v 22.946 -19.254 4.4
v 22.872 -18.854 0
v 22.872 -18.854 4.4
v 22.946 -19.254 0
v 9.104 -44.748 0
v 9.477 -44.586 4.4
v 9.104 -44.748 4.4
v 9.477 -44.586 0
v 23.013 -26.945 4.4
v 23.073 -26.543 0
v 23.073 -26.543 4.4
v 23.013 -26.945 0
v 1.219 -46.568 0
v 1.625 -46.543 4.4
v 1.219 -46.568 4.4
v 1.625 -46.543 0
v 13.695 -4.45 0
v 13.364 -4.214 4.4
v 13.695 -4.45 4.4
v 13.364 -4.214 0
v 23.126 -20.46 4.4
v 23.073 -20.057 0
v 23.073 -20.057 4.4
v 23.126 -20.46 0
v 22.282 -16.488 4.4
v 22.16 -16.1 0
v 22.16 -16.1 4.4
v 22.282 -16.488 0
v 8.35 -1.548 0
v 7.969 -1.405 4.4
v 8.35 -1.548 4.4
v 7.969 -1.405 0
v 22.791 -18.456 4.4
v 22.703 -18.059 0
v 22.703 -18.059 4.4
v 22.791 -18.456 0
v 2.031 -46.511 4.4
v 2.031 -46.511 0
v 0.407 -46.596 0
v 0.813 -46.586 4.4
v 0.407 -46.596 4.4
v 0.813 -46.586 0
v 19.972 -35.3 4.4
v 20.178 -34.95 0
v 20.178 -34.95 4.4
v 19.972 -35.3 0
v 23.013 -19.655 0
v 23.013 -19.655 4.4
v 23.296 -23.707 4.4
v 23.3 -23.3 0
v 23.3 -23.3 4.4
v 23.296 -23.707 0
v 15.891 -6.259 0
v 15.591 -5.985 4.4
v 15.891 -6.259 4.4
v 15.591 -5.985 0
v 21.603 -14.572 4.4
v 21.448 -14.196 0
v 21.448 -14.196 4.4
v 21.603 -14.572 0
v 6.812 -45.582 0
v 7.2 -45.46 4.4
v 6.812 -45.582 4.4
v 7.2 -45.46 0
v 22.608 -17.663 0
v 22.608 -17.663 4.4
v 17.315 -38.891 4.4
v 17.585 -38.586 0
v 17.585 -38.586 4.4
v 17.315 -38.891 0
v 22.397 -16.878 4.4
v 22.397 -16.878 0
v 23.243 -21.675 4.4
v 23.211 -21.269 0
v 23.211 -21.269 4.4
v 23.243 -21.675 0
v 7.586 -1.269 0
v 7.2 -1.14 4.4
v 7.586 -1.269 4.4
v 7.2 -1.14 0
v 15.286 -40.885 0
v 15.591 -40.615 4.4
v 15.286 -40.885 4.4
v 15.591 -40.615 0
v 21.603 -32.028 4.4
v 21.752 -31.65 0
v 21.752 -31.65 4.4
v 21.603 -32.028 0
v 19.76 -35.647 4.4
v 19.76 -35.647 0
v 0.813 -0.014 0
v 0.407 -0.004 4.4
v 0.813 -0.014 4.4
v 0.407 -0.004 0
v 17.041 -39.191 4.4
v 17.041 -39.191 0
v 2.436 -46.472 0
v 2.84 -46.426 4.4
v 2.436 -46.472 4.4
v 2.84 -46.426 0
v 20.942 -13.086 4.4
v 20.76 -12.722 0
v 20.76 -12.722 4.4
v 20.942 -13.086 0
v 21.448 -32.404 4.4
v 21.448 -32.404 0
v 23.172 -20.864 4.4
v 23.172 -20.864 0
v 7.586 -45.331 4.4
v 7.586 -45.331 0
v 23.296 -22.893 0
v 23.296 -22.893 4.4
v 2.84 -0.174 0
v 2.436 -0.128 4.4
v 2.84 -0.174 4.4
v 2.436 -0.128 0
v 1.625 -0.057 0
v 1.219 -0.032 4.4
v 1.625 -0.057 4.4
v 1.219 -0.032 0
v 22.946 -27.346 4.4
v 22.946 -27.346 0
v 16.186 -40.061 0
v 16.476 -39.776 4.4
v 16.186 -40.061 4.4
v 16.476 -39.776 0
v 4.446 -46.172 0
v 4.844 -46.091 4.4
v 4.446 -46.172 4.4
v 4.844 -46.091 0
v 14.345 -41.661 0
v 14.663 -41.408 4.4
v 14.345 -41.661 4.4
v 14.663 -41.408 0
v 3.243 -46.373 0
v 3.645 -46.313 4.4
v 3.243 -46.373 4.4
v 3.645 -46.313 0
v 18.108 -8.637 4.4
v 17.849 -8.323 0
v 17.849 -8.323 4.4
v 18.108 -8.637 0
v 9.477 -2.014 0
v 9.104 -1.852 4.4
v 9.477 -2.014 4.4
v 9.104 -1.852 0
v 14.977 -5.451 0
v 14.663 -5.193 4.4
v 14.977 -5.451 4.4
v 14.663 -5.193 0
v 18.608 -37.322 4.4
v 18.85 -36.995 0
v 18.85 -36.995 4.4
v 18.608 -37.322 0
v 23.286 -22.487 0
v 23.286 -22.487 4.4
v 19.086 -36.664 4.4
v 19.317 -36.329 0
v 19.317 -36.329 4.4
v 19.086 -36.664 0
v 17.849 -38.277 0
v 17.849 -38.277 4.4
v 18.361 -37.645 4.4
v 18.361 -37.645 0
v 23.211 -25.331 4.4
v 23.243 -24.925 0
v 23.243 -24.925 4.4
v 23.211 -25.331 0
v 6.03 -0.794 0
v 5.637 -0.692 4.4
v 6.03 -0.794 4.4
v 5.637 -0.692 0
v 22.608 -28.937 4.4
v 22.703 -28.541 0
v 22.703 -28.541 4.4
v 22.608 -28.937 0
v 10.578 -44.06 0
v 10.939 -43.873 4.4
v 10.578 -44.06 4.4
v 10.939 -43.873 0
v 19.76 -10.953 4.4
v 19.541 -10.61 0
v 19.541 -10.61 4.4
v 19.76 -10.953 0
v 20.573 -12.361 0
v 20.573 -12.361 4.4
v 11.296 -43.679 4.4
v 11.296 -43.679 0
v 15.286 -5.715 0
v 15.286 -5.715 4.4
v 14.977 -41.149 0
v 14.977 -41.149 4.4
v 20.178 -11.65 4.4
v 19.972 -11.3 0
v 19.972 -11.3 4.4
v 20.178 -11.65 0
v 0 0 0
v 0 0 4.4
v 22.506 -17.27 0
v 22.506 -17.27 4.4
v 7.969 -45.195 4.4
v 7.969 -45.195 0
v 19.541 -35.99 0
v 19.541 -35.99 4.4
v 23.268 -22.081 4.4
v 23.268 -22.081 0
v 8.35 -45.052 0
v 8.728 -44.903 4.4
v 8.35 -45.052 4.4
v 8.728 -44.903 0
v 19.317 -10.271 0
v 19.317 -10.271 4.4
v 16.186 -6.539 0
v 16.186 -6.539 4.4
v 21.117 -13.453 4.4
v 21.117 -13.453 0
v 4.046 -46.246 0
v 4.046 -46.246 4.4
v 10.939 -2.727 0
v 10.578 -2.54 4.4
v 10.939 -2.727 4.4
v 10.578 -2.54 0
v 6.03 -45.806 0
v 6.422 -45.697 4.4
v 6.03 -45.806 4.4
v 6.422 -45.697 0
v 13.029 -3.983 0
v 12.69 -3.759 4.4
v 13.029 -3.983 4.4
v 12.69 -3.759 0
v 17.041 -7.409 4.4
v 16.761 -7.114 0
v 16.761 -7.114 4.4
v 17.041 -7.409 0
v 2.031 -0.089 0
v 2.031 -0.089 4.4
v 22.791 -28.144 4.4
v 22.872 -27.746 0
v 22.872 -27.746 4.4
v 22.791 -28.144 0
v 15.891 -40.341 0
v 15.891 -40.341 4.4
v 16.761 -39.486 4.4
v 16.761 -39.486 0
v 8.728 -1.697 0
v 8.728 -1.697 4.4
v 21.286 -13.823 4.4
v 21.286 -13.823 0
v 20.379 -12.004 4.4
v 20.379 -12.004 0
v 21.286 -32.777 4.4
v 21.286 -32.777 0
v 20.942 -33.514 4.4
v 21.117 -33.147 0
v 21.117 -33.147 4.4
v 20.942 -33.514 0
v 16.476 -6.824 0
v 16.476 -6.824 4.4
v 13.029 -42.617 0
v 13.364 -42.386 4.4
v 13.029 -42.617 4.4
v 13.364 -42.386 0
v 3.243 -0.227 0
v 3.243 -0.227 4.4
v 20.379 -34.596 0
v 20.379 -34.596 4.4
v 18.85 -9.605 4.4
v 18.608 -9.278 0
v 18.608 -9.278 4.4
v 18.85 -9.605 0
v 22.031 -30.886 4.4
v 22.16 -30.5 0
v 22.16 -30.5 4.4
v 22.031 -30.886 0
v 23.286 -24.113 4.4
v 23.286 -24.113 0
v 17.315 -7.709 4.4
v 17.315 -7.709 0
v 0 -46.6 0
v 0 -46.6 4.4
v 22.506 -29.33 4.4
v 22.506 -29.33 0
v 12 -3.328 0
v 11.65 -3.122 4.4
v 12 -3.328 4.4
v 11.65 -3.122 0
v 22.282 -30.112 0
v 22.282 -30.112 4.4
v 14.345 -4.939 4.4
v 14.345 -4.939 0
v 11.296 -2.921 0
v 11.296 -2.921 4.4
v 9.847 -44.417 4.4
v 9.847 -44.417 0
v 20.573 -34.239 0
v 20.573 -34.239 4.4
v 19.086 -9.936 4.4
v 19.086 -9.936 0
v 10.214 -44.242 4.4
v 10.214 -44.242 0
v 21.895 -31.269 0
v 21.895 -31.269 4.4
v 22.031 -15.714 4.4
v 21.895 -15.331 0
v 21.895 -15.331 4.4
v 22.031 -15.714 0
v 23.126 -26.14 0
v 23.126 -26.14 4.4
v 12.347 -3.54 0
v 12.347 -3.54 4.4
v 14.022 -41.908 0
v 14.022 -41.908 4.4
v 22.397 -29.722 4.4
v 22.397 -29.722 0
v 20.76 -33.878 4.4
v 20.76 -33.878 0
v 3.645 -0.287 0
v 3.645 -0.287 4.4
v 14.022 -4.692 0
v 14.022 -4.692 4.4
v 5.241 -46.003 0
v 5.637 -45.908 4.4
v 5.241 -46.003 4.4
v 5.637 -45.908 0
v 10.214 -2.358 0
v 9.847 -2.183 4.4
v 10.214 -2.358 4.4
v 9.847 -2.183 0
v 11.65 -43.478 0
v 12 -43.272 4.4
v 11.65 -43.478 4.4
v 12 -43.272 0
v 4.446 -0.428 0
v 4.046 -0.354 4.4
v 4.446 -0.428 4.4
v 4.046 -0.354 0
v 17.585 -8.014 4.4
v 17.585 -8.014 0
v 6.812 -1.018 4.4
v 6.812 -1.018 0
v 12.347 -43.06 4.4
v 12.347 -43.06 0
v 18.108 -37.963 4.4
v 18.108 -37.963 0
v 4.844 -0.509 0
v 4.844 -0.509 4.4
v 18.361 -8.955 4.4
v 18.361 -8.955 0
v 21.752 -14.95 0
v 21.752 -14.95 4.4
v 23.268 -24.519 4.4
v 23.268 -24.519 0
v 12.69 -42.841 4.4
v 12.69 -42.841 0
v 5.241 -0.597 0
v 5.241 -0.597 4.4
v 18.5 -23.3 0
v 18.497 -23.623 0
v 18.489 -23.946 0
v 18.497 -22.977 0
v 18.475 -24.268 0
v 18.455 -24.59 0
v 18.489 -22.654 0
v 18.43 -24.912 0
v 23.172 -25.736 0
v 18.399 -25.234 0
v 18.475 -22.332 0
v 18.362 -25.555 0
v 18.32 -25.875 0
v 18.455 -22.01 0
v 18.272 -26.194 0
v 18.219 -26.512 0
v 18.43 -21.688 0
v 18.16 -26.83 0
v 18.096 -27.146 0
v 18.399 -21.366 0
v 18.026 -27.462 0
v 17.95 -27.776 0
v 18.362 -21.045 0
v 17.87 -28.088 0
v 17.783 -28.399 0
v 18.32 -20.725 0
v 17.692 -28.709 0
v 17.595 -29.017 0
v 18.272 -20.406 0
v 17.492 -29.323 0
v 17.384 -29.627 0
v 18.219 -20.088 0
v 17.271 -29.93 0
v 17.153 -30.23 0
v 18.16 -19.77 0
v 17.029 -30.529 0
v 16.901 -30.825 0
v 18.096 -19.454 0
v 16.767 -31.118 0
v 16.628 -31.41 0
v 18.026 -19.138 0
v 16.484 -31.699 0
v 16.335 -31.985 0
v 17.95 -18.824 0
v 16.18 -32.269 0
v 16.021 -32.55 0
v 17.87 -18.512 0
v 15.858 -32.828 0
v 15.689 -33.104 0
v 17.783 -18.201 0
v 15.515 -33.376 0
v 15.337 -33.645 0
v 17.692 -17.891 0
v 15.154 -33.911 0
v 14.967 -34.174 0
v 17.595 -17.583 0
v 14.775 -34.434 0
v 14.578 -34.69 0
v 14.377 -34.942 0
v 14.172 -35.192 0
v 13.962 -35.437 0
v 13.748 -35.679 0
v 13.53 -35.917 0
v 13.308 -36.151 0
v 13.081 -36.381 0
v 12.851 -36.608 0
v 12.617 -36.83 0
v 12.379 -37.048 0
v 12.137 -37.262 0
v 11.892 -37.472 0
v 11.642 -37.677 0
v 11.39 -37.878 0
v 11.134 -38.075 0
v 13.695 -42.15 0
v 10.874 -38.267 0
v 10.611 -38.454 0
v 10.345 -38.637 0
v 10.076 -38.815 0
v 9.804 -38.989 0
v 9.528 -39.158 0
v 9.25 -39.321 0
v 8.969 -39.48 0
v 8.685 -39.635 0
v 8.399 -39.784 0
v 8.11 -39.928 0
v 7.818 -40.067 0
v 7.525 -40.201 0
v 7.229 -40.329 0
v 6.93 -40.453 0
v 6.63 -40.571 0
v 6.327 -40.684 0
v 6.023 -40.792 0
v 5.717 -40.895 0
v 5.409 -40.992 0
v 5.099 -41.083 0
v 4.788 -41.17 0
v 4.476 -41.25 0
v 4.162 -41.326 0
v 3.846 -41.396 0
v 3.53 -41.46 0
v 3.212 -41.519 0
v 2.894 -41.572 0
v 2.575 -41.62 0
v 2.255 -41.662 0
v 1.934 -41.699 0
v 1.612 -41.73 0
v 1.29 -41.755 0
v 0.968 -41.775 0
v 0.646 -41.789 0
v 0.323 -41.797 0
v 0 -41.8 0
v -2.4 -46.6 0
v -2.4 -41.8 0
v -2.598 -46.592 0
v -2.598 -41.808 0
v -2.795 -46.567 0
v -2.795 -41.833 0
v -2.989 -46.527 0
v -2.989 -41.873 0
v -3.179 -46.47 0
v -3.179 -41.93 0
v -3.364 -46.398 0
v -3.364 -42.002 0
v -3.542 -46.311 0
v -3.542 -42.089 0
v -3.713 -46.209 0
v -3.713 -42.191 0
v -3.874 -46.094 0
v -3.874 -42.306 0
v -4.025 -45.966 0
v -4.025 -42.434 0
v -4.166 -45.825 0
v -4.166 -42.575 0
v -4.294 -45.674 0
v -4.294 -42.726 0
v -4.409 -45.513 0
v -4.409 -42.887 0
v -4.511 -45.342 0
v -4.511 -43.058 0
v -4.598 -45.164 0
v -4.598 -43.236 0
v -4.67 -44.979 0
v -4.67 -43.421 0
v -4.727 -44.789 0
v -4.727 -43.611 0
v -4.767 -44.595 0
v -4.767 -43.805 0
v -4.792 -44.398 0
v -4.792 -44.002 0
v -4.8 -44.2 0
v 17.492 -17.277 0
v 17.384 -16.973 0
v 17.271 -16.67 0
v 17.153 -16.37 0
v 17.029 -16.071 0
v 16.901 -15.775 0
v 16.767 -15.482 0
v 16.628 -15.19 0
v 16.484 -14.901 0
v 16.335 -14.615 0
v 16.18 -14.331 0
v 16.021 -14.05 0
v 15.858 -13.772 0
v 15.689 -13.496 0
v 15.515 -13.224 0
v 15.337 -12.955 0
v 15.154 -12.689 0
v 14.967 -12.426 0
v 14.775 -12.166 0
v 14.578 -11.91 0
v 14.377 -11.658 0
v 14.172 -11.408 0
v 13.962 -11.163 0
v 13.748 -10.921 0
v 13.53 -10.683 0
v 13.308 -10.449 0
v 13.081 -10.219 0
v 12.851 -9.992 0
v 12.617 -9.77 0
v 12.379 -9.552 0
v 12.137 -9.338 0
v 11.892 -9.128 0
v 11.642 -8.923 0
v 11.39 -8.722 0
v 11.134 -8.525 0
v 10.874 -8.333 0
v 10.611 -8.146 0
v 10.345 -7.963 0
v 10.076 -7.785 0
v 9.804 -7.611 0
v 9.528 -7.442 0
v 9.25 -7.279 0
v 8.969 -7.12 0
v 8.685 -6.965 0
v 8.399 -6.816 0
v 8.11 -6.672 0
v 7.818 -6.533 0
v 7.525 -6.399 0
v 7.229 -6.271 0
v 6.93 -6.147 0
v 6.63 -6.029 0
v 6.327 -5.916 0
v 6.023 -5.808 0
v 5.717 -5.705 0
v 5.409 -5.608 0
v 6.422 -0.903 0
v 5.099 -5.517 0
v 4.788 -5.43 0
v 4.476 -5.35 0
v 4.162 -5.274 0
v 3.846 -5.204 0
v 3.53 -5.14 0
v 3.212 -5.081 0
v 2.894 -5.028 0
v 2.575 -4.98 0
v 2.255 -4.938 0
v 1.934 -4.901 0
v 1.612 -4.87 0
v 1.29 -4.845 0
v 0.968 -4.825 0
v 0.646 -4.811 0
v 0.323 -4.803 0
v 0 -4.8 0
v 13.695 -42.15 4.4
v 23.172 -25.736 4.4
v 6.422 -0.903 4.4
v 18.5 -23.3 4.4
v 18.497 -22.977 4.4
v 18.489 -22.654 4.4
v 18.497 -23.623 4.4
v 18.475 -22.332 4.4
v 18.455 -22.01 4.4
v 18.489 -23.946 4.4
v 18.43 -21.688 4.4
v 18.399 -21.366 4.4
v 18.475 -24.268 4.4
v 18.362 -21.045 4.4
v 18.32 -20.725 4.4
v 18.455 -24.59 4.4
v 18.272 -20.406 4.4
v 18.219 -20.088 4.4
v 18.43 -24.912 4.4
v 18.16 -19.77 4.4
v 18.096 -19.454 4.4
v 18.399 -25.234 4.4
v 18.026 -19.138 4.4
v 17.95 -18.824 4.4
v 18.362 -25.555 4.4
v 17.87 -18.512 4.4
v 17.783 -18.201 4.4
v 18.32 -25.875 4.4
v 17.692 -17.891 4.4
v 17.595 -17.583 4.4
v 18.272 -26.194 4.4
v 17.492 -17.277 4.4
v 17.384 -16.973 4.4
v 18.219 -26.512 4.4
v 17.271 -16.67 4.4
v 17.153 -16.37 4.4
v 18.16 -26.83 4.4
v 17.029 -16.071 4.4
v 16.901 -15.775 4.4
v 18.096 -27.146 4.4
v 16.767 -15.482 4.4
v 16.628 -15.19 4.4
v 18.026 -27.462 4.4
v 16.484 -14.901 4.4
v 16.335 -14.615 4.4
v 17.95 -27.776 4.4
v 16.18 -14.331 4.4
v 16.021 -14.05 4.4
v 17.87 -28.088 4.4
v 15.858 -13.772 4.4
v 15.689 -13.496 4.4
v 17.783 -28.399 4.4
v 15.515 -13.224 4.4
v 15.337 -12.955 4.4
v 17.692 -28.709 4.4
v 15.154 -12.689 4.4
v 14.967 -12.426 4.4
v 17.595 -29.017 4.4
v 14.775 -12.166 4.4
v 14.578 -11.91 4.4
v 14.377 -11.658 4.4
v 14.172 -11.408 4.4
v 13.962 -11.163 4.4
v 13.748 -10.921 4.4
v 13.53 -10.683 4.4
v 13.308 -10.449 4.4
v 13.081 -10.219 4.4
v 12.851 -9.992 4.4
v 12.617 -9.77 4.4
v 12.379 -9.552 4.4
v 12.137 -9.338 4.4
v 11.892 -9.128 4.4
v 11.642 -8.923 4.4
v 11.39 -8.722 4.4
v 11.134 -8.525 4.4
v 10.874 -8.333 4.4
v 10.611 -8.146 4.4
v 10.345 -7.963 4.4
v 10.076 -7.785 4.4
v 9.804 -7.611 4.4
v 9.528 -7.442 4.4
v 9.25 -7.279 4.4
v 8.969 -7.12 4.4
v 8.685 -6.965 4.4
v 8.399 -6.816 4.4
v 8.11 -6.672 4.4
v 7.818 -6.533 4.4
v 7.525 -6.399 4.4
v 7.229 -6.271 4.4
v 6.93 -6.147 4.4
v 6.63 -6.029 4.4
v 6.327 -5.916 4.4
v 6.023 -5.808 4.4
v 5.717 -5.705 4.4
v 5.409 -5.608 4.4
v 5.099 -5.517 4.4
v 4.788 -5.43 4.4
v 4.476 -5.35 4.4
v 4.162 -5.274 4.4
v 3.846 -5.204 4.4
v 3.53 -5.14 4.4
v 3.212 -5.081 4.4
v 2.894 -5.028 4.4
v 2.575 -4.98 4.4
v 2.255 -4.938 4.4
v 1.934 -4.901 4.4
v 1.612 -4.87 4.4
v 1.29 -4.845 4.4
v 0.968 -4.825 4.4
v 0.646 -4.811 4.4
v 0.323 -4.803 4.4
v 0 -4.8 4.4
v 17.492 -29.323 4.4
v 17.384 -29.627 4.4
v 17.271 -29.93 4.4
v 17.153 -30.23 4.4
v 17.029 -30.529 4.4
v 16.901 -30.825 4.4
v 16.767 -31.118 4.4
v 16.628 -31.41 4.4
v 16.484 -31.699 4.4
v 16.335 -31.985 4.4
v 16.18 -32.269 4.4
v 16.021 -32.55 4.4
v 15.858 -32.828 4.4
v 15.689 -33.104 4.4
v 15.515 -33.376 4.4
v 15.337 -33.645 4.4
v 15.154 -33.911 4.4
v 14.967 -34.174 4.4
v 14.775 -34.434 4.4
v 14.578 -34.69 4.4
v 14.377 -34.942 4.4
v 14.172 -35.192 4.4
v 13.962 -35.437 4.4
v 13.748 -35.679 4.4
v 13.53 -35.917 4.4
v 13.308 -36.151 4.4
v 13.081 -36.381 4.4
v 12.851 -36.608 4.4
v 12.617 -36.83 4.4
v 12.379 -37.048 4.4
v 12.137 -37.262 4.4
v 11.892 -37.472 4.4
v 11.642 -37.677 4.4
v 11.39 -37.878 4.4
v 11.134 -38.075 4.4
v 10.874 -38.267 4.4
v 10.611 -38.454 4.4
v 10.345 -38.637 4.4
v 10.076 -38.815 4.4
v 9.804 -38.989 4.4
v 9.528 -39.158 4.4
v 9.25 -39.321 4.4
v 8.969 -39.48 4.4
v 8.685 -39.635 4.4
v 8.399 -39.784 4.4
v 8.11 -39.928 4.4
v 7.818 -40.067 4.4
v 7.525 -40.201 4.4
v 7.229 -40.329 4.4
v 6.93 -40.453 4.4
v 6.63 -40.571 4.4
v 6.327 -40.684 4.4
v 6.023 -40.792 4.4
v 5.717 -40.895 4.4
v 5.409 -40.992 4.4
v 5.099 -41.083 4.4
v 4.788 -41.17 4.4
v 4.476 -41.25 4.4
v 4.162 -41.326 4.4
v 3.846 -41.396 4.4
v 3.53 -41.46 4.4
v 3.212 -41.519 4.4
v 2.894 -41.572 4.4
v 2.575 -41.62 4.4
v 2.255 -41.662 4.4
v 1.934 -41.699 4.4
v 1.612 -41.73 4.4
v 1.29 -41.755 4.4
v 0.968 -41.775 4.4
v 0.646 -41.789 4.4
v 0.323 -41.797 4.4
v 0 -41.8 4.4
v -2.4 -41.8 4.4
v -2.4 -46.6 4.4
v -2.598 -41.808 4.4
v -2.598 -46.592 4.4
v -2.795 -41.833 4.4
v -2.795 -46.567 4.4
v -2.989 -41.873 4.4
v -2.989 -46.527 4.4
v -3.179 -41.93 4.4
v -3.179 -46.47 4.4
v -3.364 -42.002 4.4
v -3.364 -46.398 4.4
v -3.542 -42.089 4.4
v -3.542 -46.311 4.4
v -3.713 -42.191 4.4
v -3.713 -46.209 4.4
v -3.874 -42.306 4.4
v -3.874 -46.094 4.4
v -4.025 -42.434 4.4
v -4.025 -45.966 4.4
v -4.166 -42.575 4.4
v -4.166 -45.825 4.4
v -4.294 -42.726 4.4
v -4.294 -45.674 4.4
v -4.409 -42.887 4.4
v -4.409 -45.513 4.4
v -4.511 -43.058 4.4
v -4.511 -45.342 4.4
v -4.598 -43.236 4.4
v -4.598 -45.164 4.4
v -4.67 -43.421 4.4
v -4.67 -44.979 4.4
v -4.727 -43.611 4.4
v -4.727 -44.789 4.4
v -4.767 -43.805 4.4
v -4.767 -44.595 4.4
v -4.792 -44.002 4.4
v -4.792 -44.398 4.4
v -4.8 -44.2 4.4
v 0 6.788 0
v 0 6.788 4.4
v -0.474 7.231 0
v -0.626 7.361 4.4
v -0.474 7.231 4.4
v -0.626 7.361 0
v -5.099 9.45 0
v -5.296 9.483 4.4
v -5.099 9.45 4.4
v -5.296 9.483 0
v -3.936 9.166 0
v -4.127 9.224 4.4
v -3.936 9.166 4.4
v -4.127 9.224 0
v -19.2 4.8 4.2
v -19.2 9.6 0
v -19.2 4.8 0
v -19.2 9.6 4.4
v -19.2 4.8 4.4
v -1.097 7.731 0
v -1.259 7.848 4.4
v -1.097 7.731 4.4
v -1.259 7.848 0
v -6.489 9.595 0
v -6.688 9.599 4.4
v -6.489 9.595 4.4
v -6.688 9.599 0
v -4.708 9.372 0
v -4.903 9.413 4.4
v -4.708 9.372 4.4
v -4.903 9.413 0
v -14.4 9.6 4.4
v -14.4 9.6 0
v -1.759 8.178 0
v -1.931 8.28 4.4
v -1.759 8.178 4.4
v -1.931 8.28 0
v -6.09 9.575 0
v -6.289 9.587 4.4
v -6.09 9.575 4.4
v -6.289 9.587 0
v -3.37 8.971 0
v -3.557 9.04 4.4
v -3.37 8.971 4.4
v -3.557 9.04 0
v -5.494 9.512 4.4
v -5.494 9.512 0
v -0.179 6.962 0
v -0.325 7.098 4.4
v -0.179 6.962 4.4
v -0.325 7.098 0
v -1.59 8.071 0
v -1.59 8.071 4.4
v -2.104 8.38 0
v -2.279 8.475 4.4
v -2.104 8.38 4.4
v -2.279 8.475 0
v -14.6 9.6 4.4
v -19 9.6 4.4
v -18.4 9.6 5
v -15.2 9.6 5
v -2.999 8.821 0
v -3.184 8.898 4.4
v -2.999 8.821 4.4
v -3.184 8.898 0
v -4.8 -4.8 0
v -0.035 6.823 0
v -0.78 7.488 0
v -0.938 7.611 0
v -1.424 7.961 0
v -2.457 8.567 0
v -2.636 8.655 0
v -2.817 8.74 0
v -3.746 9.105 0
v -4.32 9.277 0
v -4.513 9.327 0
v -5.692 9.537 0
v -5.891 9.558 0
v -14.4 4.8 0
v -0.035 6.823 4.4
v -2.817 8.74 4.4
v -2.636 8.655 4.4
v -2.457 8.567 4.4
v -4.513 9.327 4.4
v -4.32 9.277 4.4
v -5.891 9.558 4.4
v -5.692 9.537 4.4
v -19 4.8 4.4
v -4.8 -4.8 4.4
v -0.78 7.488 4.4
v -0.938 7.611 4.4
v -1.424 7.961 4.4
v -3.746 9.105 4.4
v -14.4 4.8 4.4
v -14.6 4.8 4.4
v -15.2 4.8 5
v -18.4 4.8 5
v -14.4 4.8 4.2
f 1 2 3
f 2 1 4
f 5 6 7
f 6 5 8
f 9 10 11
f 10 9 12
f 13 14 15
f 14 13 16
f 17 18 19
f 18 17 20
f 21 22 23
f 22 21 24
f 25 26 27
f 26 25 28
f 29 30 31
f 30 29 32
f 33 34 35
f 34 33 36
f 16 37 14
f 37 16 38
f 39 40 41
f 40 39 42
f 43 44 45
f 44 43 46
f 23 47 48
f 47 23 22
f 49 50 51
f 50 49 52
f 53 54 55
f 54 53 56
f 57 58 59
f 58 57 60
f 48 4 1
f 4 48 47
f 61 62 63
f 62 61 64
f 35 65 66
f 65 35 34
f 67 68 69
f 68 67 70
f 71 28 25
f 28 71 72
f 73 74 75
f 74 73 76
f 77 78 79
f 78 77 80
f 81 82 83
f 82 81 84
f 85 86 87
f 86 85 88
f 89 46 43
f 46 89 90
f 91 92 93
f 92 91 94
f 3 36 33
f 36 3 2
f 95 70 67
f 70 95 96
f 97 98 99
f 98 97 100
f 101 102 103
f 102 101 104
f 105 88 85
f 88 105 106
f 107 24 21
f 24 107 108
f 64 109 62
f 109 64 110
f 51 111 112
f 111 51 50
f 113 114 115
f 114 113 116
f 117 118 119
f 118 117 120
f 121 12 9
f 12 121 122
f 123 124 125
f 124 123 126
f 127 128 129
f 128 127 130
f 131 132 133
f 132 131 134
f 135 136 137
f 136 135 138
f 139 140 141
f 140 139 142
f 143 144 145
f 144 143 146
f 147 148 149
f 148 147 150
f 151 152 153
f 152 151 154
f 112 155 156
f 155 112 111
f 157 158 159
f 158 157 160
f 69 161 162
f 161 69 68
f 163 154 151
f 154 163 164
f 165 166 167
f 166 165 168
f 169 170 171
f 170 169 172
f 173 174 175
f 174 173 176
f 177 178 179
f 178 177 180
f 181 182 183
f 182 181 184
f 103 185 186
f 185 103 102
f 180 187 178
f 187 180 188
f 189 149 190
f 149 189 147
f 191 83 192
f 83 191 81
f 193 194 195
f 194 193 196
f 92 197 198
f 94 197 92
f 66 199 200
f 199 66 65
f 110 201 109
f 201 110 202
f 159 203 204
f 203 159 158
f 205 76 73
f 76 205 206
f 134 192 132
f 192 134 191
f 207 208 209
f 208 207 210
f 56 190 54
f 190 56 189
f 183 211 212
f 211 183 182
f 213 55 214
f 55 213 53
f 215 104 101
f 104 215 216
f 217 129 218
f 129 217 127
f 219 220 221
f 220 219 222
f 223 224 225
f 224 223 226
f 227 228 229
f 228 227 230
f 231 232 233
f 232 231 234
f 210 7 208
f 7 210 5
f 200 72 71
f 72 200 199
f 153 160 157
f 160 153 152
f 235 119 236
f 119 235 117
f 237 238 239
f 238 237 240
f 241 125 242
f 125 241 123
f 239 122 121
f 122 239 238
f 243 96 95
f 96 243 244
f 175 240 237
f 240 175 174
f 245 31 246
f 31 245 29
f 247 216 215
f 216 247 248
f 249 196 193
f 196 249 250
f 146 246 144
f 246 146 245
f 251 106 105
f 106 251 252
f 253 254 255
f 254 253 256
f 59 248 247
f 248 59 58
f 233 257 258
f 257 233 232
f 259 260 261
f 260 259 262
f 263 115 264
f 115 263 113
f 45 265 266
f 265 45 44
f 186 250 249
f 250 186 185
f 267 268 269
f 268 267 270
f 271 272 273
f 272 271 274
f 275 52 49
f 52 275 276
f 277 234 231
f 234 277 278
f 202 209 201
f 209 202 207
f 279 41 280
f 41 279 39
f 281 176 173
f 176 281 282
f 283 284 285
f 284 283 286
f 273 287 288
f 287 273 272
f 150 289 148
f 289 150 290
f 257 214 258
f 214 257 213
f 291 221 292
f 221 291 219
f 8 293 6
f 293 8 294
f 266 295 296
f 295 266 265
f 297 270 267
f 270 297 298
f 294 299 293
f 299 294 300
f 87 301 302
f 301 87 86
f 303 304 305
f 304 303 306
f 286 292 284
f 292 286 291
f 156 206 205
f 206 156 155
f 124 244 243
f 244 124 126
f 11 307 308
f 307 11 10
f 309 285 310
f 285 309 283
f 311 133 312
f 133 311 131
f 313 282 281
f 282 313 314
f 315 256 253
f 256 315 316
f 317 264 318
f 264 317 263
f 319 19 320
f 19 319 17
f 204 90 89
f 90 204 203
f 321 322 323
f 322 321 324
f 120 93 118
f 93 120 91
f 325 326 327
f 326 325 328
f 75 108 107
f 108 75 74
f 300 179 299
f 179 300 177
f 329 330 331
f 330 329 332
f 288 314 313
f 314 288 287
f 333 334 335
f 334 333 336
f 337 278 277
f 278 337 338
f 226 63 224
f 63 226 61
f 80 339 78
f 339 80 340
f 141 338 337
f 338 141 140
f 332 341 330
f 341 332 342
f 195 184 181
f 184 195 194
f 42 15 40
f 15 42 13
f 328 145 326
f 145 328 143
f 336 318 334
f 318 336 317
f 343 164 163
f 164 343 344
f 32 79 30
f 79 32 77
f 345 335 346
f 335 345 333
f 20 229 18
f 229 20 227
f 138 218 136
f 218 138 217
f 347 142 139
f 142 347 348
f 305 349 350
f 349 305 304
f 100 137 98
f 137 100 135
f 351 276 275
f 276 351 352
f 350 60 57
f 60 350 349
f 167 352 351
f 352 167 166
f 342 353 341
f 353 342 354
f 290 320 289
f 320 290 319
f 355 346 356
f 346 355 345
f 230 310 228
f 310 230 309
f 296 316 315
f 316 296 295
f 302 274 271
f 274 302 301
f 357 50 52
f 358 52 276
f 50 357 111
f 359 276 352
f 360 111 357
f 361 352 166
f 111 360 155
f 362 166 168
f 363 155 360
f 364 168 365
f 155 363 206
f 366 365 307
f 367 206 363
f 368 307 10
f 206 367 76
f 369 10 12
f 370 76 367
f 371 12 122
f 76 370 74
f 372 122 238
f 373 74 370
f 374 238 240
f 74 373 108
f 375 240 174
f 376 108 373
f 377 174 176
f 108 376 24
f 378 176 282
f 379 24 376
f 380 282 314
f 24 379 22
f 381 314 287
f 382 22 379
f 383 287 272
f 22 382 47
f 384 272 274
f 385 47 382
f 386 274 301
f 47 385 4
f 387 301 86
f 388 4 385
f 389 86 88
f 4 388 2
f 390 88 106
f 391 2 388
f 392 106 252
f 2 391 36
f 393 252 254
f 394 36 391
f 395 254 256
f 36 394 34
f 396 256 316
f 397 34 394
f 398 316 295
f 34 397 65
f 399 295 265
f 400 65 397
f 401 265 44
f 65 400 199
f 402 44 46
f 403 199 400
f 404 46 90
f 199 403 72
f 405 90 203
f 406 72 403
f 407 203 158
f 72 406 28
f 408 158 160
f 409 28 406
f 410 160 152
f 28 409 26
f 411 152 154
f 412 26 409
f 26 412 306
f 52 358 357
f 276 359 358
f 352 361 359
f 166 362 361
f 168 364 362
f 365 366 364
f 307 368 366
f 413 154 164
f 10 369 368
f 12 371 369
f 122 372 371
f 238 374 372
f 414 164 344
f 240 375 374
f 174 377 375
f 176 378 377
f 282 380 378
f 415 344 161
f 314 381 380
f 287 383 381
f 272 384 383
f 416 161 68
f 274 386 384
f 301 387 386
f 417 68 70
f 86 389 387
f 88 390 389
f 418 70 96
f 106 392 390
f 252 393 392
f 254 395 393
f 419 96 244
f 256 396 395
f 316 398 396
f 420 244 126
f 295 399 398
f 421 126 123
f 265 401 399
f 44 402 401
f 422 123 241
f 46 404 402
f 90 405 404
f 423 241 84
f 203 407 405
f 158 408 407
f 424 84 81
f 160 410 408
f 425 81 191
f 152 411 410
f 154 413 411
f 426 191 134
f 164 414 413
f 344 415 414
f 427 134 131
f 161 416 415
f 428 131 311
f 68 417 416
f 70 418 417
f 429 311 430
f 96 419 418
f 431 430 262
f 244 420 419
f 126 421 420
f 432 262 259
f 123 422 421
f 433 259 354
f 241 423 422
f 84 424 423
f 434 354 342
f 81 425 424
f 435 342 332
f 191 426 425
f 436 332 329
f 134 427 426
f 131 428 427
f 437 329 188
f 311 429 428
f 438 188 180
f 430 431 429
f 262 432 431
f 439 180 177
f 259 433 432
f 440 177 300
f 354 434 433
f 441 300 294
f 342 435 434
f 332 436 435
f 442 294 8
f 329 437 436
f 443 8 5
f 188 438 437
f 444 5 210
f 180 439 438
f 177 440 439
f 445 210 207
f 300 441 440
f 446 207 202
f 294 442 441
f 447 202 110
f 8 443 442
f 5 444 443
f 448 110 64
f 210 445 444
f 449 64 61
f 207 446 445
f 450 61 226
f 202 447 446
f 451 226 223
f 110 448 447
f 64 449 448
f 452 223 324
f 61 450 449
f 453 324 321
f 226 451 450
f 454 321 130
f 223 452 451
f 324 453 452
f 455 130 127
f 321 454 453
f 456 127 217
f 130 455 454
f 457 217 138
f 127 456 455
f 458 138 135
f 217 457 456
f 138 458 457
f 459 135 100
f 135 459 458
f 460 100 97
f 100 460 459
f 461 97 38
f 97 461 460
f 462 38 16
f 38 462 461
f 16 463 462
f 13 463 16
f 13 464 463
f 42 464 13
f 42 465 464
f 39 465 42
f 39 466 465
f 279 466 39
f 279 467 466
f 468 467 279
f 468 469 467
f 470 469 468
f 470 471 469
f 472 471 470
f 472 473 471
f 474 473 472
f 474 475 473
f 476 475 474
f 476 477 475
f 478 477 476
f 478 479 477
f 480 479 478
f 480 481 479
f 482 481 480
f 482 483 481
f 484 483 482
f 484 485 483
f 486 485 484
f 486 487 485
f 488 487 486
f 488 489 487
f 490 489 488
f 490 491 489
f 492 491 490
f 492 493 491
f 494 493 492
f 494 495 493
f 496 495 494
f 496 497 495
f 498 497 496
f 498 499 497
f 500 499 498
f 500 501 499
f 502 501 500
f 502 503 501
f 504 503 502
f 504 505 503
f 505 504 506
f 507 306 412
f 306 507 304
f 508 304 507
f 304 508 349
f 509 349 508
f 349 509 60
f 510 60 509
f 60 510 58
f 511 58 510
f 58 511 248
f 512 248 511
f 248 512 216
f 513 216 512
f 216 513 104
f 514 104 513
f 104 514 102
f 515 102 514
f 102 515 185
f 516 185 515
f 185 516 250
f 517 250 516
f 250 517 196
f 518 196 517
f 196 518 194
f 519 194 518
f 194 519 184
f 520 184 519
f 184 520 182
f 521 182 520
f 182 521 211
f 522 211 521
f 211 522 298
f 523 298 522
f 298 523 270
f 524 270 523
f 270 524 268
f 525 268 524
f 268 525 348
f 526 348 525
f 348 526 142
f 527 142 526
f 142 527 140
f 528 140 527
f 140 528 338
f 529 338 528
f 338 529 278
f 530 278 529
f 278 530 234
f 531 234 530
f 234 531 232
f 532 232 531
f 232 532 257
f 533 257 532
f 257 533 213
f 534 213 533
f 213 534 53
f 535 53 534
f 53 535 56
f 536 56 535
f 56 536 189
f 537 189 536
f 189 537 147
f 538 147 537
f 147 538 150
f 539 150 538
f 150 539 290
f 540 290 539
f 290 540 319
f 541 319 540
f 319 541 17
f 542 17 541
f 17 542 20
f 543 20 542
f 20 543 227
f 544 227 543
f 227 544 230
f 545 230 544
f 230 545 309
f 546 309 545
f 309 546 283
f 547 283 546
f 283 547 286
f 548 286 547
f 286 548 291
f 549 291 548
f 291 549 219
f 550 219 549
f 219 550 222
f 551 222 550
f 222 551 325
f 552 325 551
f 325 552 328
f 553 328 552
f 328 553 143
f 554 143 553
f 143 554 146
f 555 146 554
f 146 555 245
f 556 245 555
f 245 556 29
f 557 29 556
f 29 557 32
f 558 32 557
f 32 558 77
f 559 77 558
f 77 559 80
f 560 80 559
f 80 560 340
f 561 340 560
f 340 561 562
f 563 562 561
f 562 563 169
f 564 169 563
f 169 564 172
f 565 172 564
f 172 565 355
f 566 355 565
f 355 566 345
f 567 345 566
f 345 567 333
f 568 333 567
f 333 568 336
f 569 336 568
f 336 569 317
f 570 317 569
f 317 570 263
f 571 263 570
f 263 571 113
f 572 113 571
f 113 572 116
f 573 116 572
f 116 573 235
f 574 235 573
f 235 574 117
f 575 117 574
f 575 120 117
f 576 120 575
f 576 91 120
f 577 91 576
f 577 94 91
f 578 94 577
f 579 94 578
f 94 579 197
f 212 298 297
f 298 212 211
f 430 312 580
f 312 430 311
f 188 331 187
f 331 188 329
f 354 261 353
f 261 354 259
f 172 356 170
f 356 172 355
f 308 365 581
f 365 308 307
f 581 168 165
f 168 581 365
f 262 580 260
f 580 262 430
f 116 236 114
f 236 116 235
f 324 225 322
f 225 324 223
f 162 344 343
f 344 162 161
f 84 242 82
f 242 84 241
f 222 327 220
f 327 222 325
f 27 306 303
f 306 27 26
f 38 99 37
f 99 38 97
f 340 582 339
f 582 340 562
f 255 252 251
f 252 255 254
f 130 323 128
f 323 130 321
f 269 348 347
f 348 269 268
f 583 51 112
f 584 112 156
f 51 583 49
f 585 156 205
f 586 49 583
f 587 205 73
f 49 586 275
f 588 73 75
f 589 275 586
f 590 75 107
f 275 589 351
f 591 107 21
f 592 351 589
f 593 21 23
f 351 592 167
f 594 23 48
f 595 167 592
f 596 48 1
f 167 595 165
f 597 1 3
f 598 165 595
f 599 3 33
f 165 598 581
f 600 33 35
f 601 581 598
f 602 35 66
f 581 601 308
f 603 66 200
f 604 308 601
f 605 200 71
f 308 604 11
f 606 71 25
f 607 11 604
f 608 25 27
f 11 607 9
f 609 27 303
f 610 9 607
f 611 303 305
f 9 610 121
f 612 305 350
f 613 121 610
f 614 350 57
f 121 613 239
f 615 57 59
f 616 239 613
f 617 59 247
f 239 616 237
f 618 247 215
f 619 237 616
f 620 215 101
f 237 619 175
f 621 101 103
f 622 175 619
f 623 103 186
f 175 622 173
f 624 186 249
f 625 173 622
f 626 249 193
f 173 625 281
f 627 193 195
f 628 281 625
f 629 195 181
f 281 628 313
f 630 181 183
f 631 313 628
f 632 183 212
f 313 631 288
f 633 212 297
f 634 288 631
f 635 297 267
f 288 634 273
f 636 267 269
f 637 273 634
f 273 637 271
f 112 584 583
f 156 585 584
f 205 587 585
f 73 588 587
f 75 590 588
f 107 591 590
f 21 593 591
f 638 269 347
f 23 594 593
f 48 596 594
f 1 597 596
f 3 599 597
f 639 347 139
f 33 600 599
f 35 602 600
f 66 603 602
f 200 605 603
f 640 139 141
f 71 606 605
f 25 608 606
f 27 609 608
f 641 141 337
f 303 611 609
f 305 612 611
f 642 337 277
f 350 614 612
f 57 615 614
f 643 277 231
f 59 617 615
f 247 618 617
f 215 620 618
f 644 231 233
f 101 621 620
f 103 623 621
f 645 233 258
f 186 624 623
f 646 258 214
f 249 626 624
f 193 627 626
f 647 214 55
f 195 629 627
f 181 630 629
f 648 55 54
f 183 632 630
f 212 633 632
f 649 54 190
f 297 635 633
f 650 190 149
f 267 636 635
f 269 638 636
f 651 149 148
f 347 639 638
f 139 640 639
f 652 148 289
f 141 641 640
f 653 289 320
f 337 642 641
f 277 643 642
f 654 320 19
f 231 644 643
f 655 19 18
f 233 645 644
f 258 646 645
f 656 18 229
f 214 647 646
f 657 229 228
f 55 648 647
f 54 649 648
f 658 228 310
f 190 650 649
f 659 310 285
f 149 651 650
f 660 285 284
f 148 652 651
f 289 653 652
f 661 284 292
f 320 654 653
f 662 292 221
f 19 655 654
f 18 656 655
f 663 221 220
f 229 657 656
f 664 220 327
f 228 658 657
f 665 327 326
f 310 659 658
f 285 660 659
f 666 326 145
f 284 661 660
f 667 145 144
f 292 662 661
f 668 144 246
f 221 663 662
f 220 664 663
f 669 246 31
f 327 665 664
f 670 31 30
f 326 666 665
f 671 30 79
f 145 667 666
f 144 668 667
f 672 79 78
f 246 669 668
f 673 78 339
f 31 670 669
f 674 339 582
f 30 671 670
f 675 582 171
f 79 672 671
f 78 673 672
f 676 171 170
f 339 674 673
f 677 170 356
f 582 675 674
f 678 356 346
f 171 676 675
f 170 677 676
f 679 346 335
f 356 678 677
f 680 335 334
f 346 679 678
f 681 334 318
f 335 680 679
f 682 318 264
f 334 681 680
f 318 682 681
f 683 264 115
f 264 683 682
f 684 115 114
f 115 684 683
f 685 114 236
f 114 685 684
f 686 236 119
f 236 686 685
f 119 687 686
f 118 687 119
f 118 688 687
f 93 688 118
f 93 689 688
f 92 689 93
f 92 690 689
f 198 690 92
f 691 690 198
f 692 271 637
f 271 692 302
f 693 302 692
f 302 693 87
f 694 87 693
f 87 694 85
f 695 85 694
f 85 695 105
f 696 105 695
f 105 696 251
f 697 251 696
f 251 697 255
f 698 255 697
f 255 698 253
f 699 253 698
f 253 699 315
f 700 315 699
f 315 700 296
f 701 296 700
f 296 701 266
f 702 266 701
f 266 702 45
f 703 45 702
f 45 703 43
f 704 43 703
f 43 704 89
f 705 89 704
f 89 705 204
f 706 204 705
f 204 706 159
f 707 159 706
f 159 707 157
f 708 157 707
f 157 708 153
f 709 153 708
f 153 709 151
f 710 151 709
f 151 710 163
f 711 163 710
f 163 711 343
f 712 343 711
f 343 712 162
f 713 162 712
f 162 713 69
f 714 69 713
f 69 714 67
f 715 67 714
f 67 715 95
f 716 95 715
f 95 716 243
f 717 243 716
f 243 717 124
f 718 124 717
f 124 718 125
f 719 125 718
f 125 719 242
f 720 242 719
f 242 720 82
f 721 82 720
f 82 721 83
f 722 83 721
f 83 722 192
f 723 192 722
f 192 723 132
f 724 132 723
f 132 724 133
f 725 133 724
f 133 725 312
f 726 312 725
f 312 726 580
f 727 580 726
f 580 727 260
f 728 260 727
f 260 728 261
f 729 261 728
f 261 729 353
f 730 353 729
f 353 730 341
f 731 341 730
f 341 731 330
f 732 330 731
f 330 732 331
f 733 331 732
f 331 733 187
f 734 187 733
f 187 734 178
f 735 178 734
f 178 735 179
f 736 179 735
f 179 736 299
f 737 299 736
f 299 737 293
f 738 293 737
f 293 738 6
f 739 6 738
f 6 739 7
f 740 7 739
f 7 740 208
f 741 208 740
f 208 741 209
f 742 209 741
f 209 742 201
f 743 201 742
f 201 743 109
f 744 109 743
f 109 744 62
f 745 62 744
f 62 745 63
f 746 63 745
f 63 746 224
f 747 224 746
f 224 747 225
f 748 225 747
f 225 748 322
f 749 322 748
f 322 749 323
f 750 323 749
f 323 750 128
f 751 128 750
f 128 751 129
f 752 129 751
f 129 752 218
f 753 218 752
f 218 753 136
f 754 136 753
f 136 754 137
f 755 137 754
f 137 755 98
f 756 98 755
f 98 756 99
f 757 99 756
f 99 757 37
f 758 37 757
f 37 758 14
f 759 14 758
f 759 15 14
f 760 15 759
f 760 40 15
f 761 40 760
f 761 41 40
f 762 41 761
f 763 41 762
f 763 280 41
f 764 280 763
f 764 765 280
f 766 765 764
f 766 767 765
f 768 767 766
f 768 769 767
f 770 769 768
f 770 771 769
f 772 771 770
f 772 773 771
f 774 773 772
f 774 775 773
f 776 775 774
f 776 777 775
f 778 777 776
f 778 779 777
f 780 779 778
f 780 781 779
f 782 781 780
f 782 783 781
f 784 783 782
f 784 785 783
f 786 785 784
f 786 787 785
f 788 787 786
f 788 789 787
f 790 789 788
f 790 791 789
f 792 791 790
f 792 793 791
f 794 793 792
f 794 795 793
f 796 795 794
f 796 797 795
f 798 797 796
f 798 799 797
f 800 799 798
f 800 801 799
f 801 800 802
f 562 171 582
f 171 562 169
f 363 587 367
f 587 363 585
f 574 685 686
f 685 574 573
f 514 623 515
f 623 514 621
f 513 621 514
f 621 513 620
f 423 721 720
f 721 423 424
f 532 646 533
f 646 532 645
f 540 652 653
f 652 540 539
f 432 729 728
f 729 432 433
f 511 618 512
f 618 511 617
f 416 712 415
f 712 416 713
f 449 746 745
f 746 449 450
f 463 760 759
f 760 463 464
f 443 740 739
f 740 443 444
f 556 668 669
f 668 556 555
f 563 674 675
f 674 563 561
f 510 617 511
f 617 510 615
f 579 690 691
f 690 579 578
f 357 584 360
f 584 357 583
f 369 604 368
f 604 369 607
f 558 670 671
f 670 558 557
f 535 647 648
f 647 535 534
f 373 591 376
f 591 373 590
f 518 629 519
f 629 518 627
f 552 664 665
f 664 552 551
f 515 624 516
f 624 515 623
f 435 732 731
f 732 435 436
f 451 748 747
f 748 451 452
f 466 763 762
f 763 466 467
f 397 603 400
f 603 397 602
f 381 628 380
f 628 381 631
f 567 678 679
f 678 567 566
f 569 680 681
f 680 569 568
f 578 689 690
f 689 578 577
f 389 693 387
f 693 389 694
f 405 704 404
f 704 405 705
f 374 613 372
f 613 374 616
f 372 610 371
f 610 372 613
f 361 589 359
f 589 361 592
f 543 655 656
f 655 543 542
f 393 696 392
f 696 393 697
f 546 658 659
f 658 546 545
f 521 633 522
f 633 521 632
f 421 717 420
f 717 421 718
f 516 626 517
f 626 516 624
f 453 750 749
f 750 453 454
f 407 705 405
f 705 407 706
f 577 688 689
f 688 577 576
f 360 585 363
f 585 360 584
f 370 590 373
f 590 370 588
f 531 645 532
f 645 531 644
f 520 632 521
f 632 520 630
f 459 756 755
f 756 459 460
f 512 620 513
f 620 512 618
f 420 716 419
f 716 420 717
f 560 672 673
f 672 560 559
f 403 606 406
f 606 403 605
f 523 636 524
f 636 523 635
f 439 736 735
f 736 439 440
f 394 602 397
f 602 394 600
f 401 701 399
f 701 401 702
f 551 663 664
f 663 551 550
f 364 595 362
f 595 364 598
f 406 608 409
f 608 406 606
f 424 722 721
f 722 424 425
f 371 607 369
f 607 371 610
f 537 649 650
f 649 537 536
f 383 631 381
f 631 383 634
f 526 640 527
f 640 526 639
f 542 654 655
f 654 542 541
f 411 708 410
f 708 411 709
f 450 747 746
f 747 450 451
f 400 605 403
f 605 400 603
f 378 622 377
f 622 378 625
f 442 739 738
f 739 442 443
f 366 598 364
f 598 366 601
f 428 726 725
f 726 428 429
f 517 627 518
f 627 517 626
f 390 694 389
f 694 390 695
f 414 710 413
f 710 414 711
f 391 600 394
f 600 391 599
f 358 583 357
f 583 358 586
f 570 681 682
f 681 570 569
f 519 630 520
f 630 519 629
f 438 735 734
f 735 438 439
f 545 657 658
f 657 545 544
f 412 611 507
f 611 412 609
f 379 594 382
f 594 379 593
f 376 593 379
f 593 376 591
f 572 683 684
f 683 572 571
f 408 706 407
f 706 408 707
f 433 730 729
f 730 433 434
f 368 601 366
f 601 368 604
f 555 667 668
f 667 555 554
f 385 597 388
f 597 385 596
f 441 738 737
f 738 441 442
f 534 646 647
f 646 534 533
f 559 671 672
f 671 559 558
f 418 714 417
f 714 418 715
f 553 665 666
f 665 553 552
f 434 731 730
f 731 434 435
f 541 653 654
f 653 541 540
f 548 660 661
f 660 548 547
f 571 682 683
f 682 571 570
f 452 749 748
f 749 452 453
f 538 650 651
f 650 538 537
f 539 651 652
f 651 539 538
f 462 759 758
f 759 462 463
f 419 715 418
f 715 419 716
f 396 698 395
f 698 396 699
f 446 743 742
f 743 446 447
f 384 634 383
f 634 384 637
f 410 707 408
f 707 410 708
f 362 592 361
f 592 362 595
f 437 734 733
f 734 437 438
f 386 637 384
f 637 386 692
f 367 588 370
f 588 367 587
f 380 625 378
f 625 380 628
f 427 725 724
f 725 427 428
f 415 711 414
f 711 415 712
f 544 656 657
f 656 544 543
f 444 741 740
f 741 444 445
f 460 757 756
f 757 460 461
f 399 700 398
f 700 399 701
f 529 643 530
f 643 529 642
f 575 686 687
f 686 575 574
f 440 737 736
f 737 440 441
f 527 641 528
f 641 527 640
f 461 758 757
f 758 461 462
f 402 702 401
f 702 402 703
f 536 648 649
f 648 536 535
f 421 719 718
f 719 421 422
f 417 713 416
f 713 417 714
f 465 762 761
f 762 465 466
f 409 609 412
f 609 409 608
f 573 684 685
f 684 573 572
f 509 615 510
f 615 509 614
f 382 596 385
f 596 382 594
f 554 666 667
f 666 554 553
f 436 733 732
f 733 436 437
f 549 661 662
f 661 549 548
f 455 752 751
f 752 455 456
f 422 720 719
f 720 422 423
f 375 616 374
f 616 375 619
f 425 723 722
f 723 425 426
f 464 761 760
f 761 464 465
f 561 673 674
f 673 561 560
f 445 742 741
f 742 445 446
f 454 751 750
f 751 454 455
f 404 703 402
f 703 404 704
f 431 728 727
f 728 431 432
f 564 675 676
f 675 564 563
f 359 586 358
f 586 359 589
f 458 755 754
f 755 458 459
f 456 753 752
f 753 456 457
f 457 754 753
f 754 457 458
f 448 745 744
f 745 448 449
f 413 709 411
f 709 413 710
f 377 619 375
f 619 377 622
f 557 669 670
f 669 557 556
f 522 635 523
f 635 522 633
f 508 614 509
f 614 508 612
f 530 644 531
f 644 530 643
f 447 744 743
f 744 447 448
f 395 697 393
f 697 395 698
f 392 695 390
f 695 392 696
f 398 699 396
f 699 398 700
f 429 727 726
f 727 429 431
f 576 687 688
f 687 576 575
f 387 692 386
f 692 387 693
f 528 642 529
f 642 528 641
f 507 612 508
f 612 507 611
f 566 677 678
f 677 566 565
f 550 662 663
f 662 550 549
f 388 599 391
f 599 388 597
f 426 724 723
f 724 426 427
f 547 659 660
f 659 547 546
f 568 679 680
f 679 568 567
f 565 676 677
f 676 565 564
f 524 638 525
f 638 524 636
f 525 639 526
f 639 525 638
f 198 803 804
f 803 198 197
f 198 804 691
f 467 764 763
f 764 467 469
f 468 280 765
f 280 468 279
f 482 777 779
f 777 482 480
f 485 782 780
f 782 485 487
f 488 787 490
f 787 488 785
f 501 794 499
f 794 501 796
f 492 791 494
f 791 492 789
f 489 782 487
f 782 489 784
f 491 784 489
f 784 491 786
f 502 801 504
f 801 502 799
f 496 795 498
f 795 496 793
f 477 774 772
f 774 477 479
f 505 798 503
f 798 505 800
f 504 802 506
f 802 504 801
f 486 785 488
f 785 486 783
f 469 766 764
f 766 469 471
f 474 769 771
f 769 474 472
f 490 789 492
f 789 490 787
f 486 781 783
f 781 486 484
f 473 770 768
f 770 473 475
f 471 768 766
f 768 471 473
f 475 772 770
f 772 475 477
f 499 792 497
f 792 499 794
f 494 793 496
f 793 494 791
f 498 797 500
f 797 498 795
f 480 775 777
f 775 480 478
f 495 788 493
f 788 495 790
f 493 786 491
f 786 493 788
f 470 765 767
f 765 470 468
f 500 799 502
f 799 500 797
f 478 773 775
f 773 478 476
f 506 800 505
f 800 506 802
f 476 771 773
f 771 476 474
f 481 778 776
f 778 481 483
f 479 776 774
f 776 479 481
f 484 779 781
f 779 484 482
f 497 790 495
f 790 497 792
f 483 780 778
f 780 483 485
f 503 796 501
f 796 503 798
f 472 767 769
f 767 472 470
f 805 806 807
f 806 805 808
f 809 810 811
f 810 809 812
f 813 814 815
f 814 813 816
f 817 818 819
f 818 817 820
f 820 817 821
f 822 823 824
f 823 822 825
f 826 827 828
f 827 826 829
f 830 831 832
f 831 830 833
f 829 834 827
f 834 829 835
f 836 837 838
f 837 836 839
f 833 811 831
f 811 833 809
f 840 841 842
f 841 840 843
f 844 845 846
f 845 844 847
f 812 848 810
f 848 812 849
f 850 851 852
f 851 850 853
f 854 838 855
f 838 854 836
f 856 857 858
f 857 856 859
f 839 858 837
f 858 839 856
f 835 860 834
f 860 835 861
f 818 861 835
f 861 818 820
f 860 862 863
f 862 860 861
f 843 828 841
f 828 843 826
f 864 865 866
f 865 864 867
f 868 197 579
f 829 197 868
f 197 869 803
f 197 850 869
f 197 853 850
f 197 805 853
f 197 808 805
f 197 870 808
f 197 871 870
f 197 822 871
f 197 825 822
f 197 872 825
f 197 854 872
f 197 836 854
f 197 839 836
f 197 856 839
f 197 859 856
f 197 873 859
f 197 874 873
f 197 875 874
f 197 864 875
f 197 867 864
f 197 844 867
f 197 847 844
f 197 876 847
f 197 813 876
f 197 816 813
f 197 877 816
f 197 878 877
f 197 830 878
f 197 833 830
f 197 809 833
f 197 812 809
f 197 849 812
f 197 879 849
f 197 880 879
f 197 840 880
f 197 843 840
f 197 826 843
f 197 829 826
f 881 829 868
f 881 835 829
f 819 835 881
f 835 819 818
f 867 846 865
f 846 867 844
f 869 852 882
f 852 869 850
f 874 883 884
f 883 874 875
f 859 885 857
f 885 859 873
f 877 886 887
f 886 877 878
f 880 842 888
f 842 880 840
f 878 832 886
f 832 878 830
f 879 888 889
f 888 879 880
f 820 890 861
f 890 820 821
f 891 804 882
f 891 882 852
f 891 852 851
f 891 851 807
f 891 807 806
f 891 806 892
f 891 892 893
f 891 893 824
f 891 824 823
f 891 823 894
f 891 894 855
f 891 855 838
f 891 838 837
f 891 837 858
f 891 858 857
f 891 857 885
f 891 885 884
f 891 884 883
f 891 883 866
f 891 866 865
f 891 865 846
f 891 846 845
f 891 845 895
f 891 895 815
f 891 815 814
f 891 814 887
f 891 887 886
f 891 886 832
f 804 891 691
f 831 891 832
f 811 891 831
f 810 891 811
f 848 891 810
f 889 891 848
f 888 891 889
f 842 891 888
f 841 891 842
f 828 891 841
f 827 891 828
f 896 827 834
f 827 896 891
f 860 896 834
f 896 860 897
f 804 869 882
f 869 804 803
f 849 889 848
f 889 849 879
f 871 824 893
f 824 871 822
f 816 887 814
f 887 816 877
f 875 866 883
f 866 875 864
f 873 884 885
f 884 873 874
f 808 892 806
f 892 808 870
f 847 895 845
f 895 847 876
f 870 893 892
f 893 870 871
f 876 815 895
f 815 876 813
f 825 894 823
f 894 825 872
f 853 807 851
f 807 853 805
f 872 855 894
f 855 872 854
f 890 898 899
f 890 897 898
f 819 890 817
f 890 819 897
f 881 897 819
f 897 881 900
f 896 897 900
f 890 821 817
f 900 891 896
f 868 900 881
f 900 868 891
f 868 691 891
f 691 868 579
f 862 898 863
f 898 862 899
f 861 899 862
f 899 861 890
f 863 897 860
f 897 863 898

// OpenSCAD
include <./ikea_skadis.scad>

skadis_curved_hook(37, fullfill = true, retainer = true);

// translate ([0, 120, 0]) skadis_curved_hook(45, fullfill = true, retainer = true);
